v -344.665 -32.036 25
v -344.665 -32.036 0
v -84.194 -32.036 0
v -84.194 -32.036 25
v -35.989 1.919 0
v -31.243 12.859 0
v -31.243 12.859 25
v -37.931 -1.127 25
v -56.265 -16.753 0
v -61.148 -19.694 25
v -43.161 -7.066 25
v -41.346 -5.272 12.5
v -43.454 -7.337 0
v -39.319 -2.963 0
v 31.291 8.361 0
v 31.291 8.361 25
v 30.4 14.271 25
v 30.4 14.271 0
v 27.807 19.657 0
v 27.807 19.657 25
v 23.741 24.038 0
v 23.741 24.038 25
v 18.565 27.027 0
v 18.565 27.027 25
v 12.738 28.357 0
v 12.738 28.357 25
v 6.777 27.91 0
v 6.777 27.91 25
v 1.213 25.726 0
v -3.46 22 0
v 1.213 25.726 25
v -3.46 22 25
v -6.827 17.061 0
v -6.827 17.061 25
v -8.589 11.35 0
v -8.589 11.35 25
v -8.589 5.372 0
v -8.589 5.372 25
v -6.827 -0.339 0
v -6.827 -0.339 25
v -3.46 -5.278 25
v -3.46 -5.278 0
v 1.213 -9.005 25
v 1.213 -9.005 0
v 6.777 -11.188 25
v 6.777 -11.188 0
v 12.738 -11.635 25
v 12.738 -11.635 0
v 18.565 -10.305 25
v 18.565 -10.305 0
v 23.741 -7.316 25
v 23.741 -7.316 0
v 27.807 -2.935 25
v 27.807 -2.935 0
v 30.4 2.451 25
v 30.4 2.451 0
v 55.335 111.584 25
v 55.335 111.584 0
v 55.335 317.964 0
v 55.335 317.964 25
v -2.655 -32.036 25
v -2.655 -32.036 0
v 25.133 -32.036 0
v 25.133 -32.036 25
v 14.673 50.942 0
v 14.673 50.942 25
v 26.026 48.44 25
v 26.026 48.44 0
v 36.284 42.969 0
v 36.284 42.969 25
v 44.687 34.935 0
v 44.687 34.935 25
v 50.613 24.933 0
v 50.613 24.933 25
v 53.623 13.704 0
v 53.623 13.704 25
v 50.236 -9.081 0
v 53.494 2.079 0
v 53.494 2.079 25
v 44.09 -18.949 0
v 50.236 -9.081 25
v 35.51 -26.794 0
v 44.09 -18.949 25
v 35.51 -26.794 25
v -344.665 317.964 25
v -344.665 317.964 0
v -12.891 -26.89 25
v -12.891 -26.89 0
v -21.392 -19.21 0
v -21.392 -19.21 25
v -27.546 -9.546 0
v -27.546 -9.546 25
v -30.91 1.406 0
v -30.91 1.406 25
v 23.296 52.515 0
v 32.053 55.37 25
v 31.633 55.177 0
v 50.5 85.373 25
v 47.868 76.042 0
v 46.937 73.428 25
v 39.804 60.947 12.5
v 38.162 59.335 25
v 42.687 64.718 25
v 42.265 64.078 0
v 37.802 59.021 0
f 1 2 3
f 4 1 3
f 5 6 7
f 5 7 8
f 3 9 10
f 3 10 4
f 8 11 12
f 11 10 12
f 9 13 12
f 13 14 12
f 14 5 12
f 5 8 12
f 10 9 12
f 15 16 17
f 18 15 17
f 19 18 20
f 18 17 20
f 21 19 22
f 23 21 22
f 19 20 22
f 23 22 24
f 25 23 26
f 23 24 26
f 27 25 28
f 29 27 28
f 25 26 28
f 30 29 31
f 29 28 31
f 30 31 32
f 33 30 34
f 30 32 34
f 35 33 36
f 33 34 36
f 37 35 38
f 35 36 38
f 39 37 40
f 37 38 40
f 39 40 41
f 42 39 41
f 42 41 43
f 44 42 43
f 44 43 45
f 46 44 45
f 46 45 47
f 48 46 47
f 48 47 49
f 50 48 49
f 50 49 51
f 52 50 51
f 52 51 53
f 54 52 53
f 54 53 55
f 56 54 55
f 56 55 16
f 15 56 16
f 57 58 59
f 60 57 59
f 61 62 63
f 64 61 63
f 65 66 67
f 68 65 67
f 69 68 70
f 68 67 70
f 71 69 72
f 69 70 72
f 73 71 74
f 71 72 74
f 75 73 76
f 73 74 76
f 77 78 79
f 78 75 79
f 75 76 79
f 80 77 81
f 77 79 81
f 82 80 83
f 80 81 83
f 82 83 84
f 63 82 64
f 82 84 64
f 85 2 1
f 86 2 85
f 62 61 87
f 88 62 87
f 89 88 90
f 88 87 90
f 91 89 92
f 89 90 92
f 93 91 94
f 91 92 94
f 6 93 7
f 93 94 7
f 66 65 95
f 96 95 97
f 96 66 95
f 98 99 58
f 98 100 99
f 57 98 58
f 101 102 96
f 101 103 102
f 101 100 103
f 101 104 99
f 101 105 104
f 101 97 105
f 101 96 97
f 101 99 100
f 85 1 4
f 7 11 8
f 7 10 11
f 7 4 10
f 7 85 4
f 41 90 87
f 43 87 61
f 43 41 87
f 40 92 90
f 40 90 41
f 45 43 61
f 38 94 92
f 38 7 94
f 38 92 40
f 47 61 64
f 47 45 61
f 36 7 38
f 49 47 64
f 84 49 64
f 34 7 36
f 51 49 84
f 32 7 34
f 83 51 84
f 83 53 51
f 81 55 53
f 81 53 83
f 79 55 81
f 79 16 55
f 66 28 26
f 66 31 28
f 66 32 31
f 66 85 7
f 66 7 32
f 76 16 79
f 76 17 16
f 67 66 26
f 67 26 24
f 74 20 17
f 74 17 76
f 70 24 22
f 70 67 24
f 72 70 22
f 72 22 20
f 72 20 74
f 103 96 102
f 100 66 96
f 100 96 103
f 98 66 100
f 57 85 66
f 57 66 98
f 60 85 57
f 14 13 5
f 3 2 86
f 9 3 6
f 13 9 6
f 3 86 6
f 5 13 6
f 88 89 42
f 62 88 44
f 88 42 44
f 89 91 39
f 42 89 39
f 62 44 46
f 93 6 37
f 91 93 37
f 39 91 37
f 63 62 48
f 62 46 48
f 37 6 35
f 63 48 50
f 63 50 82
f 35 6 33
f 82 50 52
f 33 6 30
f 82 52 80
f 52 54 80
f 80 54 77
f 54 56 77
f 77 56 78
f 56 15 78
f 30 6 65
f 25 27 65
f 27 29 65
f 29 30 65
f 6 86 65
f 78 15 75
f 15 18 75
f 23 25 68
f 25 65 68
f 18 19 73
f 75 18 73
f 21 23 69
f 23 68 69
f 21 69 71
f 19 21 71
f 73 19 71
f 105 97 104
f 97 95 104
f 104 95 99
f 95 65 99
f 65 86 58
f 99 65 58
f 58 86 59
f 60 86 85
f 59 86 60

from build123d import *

# Parameters (mm, degrees)
F0_W     = 400
F0_H     = 350
F1_DEPTH = 25
F3_DEPTH = 25.001
F4_DEPTH = 25.0010001
F2_R     = 20.0519233488
F5_DEPTH = 25.0010001


with BuildPart() as f1:
    # F0 (on Top) → F1 (new body)
    with BuildSketch(Plane.XY):
        with Locations((-144.6653090417, 142.9641239345)):
            Rectangle(F0_W, F0_H)
    extrude(amount=F1_DEPTH)

    # F2 (on face) → F3 (cut, through all)
    with BuildSketch(Plane.XY.offset(25)):
        with BuildLine():
            ThreePointArc((14.6728275564, 50.9421979835), (42.6369617116, 37.3287987877), (53.9587082521, 8.3609633148))
            ThreePointArc((53.9587082521, 8.3609633148), (46.0135328545, -16.4523625465), (25.1333734011, -32.0358760655))
            Line((25.1333734011, -32.0358760655), (55.3346909583, -32.0358760655))
            Line((55.3346909583, -32.0358760655), (55.3346909583, 111.5844994783))
            add(Edge.make_bspline(
                [(14.6728275564, 50.9421979835), (24.0249471422, 52.4532118897), (46.4627784533, 56.0993989243), (52.0670924126, 91.1428923077), (55.3346909583, 111.5844994783)],
                knots=[0, 0, 0, 0, 0.4167837217, 1, 1, 1, 1], degree=3))
        make_face()
    extrude(amount=-F3_DEPTH, mode=Mode.SUBTRACT)

    # F2 (on face) → F4 (cut, through all)
    with BuildSketch(Plane.XY.offset(25)):
        with BuildLine():
            ThreePointArc((-2.6548450803, -32.0358760655), (-24.7946762396, -14.5847561717), (-31.242761182, 12.8585656004))
            add(Edge.make_bspline(
                [(-31.242761182, 12.8585656004), (-33.4655953482, 6.747804549), (-39.2217861607, -8.8798649), (-67.1567385689, -23.2725037808), (-84.1938108206, -32.0358760655)],
                knots=[0, 0, 0, 0, 0.3906074154, 1, 1, 1, 1], degree=3))
            Line((-84.1938108206, -32.0358760655), (-2.6548450803, -32.0358760655))
        make_face()
    extrude(amount=-F4_DEPTH, mode=Mode.SUBTRACT)

    # F2 (on face) → F5 (cut, through all)
    with BuildSketch(Plane.XY.offset(25)):
        with Locations((11.2392641604, 8.3609633148)):
            Circle(F2_R)
    extrude(amount=-F5_DEPTH, mode=Mode.SUBTRACT)


solid = f1.part
